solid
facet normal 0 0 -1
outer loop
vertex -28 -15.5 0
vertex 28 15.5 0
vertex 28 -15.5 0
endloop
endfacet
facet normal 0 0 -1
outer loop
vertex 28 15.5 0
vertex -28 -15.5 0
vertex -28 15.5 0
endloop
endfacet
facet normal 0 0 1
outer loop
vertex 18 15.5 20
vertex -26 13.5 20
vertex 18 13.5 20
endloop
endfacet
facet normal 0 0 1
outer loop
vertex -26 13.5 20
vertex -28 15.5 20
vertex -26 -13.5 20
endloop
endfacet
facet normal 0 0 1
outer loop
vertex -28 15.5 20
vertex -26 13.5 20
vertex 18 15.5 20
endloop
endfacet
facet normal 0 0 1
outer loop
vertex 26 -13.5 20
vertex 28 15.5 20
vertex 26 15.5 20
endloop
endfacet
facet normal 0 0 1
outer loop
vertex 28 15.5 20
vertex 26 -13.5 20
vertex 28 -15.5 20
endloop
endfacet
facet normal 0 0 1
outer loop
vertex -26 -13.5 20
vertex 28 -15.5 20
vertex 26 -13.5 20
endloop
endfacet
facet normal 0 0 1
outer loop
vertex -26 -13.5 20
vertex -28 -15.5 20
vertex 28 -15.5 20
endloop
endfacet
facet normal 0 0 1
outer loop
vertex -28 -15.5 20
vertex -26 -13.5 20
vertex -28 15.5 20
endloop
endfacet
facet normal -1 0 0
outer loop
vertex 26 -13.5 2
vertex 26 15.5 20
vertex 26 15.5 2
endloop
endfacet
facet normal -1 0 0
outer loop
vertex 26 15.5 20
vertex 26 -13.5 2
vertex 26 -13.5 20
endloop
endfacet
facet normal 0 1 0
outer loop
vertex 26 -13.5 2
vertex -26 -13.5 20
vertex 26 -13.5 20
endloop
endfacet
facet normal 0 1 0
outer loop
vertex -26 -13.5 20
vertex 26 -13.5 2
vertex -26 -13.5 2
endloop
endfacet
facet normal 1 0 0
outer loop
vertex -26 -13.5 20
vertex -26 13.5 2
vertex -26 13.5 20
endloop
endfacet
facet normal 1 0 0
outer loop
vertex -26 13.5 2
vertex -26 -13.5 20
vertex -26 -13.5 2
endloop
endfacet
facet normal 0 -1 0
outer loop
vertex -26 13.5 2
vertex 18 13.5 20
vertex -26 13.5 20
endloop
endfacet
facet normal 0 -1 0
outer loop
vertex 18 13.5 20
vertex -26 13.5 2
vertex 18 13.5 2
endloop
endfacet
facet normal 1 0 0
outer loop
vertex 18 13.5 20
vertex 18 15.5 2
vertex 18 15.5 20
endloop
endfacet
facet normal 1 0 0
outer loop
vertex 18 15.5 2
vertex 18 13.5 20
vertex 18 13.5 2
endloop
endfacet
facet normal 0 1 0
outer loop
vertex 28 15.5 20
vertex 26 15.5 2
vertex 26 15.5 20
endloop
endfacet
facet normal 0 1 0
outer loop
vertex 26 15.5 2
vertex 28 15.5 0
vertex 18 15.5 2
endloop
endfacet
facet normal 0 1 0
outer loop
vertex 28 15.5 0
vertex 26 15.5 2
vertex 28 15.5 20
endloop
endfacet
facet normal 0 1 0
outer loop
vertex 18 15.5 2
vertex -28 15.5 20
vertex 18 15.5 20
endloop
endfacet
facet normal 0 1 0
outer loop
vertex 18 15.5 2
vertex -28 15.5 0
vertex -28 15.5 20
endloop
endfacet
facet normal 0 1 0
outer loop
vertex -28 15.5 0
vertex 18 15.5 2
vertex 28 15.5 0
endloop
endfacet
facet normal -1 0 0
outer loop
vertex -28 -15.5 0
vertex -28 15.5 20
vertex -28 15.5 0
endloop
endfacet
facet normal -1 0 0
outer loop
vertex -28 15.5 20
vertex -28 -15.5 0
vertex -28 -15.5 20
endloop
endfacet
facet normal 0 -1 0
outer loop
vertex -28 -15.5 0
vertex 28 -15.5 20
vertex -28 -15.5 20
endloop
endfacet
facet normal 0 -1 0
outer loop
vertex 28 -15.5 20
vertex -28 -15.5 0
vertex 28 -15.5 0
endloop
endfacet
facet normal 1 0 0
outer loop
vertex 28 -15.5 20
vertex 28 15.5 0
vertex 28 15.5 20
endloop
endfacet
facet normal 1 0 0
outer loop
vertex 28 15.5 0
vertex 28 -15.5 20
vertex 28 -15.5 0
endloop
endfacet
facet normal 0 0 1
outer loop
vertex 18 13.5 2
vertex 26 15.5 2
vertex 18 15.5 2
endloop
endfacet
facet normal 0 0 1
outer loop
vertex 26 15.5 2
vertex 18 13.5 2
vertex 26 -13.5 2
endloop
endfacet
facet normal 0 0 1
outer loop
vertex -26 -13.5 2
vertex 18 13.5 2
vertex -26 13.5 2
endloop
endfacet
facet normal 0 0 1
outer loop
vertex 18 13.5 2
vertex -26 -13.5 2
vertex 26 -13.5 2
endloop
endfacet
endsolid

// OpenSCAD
$fa = 1;
$fs = 0.4;

thickness = 2;
wall_thickness = 3;
button_size = 12.5;

switch_diameter = 6;
switch_x = -33;
switch_y = -25;
switch_height = 3.8;
switch_inset_diameter = 8;
switch_inset_depth = 2;


// Actual 9v battery dimensions:
// 48.5 mm × 26.5 mm × 17.5 mm
battery_length = 52; // extra space for connector.
battery_width = 27;
battery_depth = 18;

battery_holder_wall_thickness = 2;

case_width = 90;
case_height = 96;
corner_radius = 5;

battery_x = case_width/2 - battery_length/2 - wall_thickness - battery_holder_wall_thickness;
battery_y = -case_height/2 + battery_width/2 + 2*corner_radius + battery_holder_wall_thickness;

viewport_width = 30.5;
viewport_height = 21.5;
viewport_y = -20.3;

lcd_width = 40;
lcd_height = 34;
lcd_depth = 6.3;
lcd_y = -23;


case_depth = thickness + lcd_depth + thickness + battery_depth + thickness + 1;

screw_radius = 1.7;
screw_insert_radius = 2;
screw_head_radius = 3;
screw_depth = 8;

screw_x = case_width/2-corner_radius;
screw_y = case_height/2-corner_radius;

screw_positions = [
    [-screw_x, -screw_y],
    [-screw_x, screw_y],
    [screw_x, -screw_y],
    [screw_x, screw_y],
];

button_positions = [
    [-20, 8],
    [-20, 38],
    [-35, 23],
    [-5, 23],
    [20, 28],
    [35, 13],
];

module button_cutout_2d() {
    square([button_size, button_size], center=true);
}

module button_holder() {
    holder_thickness = 2;
    translate([0, 0, thickness + holder_thickness/2]) cube([button_size+7.5, button_size-thickness, holder_thickness], center=true);
}

module switch_holder() {
    holer_radius = switch_diameter/2+3;
    linear_extrude(switch_inset_depth, scale=switch_diameter/switch_inset_diameter) {
        difference() {
            circle(holer_radius * switch_inset_diameter/switch_diameter);
            circle(switch_inset_diameter/2);
        }
    }
    translate([0, 0, switch_inset_depth]) linear_extrude(switch_height) {
        difference() {
            circle(holer_radius);
            circle(switch_diameter/2);
        }
    }
}

module screw_holder() {
    linear_extrude(case_depth-thickness) {
        difference() {
            circle(corner_radius);
            circle(screw_insert_radius);
        }
    }
    
    linear_extrude(case_depth-screw_depth) {
        circle(corner_radius);
    }
}

module lcd_holder() {
    bar_width = 3;
    bar_length = 8;
    hbar_x = lcd_width/2-bar_length/2+bar_width;
    hbar_y = lcd_height/2+bar_width/2;
    vbar_x = lcd_width/2+bar_width/2;
    vbar_y = lcd_height/2-bar_length/2+bar_width;
    linear_extrude(thickness + 2) {
        translate([hbar_x, hbar_y]) {
            square([bar_length, bar_width], center=true);
        }
        translate([hbar_x, -hbar_y]) {
            square([bar_length, bar_width], center=true);
        }
        translate([-hbar_x, hbar_y]) {
            square([bar_length, bar_width], center=true);
        }
        translate([-hbar_x, -hbar_y]) {
            square([bar_length, bar_width], center=true);
        }

        translate([vbar_x, vbar_y]) {
            square([bar_width, bar_length], center=true);
        }
        translate([vbar_x, -vbar_y]) {
            square([bar_width, bar_length], center=true);
        }
        translate([-vbar_x, vbar_y]) {
            square([bar_width, bar_length], center=true);
        }
        translate([-vbar_x, -vbar_y]) {
            square([bar_width, bar_length], center=true);
        }
    }
}

module case_shape_2d() {
    union() {
        square([case_width, case_height-2*corner_radius], center=true);
        square([case_width-2*corner_radius, case_height], center=true);
        
        for (screw_pos = screw_positions) {
            translate(screw_pos) {
                circle(corner_radius);
            }
        }
    }
}

module front_plate() {
    linear_extrude(thickness) difference() {
        case_shape_2d();
        
        translate([0, viewport_y]) {
            square([viewport_width, viewport_height], center=true);
        }
        
        translate([switch_x, switch_y]) {
            circle(switch_inset_diameter/2);
        }
        
        for (button_pos = button_positions) {
            translate(button_pos) {
                button_cutout_2d();
            }
        }
    }

    translate([switch_x, switch_y]) switch_holder();

    translate([0, lcd_y]) lcd_holder();

    for (button_pos = button_positions) {
        translate(button_pos) {
            button_holder();
        }
    }
    
    translate([32, battery_y]) {
        linear_extrude(thickness + lcd_depth) {
            square([15, 20], center=true);
        }
    }
}


module front_walls() {
    linear_extrude(case_depth-thickness) {
        for (wall_sign = [-1, 1]) {
            translate([wall_sign*(case_width/2-wall_thickness/2), 0]) {
                square([wall_thickness, case_height-2*corner_radius], center=true);
            }
            
            translate([0, wall_sign*(case_height/2-wall_thickness/2)]) {
                square([case_width-2*corner_radius, wall_thickness], center=true);
            }
        }
    }
}

module front() {
    front_plate();

    
    for (screw_pos = screw_positions) {
        translate(screw_pos) {
            screw_holder();
        }
    }
    front_walls();
}

module back() {
    linear_extrude(thickness) difference() {
        case_shape_2d();
        
        for (screw_pos = screw_positions) {
            translate(screw_pos) {
                circle(screw_radius);
            }
        }
    }
    
    /*
    linear_extrude(2.5) difference() {
        case_shape_2d();
        
        for (screw_pos = screw_positions) {
            translate(screw_pos) {
                circle(screw_head_radius);
            }
        }
    }
    */
}


module battery_holder() {
    side_thickness = battery_holder_wall_thickness;

    holder_width = battery_length+2*side_thickness;
    holder_height = battery_width+2*battery_holder_wall_thickness;
    
    bar_depth = battery_depth + thickness;
    gap_size = 10;
    
    linear_extrude(bar_depth) {
        translate([-holder_width/2 + side_thickness/2, 0]) {
            square([side_thickness, holder_height], center=true);
        }
        
        translate([holder_width/2 - side_thickness/2, 0]) {
            square([side_thickness, holder_height], center=true);
        }
        
        translate([0, -holder_height/2 + side_thickness/2]) {
            square([holder_width/2, side_thickness], center=true);
        }
        translate([0, -holder_height/2 + side_thickness/2]) {
            square([holder_width, side_thickness], center=true);
        }
        
        translate([-gap_size/2, holder_height/2 - side_thickness/2]) {
            square([holder_width-gap_size, side_thickness], center=true);
        }
    }
    
    linear_extrude(thickness) {
        square([holder_width, holder_height], center=true);
    }
}

// front();

//back();

battery_holder();

/*
translate([battery_x, battery_y, lcd_depth+thickness]) {
    // color("red") translate([0, 0, battery_depth/2+thickness]) cube([battery_length, battery_width, battery_depth], center=true);
    
    color("green") battery_holder();
}
*/
